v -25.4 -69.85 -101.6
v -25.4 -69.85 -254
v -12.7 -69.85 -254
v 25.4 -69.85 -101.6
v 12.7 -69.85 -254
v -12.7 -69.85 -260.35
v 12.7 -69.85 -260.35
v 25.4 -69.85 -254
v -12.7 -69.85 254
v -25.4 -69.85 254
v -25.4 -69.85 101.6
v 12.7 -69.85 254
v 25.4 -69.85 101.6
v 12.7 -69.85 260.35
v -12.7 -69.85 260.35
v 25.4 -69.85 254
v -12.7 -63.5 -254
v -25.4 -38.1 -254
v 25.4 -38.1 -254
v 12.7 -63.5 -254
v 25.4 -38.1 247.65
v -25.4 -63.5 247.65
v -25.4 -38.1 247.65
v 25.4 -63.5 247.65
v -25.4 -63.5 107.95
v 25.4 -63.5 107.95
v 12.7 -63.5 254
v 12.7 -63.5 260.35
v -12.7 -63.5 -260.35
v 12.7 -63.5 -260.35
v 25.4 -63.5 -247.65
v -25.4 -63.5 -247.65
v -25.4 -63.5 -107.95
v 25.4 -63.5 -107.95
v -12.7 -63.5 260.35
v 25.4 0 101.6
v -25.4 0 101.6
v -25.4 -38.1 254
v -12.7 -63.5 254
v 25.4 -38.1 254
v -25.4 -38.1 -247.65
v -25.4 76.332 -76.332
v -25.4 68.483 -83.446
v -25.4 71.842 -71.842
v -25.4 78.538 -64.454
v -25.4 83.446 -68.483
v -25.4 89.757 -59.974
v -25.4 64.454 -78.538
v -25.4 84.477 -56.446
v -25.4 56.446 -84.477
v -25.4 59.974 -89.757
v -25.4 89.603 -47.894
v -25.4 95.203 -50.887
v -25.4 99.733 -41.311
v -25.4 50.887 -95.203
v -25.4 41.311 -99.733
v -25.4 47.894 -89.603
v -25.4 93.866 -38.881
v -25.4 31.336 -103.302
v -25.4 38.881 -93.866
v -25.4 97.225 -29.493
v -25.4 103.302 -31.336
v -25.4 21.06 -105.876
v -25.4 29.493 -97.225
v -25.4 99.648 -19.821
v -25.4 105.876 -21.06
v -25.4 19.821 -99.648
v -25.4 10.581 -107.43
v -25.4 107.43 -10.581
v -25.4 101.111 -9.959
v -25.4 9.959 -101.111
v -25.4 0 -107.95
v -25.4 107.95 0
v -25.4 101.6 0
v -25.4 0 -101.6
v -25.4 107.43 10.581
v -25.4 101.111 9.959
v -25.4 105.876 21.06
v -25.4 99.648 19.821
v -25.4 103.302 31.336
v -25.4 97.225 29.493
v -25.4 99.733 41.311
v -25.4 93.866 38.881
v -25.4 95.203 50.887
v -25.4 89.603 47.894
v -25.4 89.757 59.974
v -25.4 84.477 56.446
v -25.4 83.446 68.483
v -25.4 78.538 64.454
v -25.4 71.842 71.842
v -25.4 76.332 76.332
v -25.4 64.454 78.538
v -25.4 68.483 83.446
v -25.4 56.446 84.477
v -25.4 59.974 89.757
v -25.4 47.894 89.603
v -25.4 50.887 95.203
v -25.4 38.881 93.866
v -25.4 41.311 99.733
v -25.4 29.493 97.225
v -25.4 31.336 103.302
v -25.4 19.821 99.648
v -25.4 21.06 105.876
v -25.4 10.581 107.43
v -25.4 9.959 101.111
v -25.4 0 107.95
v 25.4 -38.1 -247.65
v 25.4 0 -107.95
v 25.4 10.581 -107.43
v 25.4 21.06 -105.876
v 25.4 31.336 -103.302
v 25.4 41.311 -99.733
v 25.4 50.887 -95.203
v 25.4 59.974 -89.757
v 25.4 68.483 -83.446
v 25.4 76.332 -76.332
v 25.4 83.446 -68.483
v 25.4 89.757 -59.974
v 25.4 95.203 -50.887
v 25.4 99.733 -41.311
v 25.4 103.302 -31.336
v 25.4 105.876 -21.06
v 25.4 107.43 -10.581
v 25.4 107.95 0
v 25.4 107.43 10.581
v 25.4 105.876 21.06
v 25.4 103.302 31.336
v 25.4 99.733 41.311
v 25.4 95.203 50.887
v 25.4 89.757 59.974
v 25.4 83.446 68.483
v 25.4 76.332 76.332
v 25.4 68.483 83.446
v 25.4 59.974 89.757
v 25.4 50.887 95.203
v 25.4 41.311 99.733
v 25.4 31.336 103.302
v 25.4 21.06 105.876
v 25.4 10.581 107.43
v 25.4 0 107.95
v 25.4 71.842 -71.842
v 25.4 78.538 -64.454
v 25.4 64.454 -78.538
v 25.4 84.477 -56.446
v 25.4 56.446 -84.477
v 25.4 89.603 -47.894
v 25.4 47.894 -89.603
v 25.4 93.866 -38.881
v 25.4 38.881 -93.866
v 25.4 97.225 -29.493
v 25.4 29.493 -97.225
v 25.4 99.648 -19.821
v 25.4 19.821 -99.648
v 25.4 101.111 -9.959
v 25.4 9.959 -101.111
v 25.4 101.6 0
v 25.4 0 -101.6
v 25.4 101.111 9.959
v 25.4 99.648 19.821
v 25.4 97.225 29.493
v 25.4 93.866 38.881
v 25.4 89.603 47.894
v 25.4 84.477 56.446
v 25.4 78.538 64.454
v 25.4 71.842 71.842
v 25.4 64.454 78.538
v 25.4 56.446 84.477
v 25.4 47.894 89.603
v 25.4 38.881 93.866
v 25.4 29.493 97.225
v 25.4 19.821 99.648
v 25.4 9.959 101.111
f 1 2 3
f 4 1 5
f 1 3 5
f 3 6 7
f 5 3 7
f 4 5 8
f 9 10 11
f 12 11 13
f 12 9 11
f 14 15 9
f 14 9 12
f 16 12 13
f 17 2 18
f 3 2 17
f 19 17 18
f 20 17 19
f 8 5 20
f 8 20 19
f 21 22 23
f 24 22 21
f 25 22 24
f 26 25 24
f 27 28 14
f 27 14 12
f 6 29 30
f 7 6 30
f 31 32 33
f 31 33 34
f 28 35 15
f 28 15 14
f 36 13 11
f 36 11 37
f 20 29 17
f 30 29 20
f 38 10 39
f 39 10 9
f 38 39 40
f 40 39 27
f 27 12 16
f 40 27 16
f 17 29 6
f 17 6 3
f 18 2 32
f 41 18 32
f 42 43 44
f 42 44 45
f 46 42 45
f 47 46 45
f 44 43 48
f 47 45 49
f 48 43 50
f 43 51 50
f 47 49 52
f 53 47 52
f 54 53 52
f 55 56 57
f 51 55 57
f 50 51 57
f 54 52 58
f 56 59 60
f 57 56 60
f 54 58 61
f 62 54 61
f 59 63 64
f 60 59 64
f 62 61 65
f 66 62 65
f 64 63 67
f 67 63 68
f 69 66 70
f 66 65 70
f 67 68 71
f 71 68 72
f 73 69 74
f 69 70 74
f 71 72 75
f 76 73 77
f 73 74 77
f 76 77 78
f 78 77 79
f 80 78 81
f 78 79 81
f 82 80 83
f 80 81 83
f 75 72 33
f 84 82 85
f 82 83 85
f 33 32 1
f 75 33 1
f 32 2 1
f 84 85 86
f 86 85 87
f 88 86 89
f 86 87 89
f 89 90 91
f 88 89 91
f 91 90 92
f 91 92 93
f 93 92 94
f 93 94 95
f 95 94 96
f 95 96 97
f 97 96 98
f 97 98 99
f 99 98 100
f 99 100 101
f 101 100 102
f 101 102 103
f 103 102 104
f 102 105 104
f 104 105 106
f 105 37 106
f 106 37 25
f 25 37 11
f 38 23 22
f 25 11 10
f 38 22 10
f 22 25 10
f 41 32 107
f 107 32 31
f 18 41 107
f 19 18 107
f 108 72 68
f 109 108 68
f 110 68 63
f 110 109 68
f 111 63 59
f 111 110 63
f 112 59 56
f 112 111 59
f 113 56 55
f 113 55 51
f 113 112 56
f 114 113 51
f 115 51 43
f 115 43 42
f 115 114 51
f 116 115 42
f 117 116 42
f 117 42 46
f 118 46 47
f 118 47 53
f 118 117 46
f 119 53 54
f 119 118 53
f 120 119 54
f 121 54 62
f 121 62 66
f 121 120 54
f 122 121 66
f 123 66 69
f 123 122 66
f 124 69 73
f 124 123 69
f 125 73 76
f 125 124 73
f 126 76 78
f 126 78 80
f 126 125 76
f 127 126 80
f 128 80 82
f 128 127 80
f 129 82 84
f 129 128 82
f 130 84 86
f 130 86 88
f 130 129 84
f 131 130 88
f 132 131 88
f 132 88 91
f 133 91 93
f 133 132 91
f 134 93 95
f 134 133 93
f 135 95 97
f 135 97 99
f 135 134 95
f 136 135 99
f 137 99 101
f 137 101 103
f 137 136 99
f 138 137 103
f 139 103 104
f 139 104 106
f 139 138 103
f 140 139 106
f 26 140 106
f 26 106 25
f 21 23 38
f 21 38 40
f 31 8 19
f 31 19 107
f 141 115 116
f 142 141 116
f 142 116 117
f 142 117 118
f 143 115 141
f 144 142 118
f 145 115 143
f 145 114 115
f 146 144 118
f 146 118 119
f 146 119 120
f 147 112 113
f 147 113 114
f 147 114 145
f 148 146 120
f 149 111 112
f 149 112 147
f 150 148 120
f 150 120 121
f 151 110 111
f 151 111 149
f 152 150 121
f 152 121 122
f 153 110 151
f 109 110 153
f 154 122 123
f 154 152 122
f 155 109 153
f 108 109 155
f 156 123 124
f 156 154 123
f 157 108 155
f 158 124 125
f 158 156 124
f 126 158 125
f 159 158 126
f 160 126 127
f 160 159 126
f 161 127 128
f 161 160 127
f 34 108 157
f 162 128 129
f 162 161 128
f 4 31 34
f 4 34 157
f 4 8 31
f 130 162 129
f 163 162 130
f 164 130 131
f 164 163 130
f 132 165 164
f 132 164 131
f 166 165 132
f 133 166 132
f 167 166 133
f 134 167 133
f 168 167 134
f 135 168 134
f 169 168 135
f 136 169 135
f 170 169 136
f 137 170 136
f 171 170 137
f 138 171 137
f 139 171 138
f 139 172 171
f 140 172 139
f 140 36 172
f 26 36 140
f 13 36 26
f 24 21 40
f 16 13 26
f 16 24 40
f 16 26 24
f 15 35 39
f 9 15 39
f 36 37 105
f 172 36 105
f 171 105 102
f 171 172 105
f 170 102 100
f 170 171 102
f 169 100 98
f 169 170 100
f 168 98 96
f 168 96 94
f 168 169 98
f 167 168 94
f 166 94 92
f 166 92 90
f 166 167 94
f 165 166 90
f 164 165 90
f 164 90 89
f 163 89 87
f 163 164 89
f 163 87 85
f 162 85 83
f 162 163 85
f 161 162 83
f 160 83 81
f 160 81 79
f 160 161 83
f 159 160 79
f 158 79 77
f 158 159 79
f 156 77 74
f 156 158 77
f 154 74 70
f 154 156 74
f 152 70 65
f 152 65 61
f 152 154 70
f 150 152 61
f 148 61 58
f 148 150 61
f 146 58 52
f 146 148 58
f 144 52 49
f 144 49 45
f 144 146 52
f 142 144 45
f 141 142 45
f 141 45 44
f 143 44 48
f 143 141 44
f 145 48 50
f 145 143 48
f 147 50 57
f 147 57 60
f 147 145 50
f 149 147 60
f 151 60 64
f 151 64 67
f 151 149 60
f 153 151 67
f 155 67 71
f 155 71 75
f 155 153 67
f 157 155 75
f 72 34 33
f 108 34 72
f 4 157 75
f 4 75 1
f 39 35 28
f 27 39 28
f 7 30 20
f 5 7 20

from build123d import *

# Parameters (mm, degrees)
BOSS_EXTRUDE1_DEPTH = 25.4
BOSS_EXTRUDE2_REACH = 380.558
SKETCH2_W           = 50.8
SKETCH2_H           = 6.35
SKETCH3_W           = 25.4
SKETCH3_H           = 6.35
BOSS_EXTRUDE3_DEPTH = 6.35
SKETCH4_W           = 50.8
SKETCH4_H           = 6.35
BOSS_EXTRUDE4_DEPTH = 25.4


with BuildPart() as part:
    # Sketch1 → Boss-Extrude1 (new, symmetric)
    with BuildSketch(Plane(origin=(0, 0, 0), x_dir=(0, 0, -1), z_dir=(1, 0, 0))):
        with BuildLine():
            Line((-107.95, 0), (-107.95, -69.85))
            Line((-107.95, -69.85), (-101.6, -69.85))
            Line((-101.6, -69.85), (-101.6, 0))
            ThreePointArc((-101.6, 0), (0, 101.6), (101.6, 0))
            Line((101.6, 0), (101.6, -69.85))
            Line((101.6, -69.85), (107.95, -69.85))
            Line((107.95, -69.85), (107.95, 0))
            ThreePointArc((107.95, 0), (0, 107.95), (-107.95, 0))
        make_face()
    extrude(amount=BOSS_EXTRUDE1_DEPTH, both=True)

    # Sketch2 → Boss-Extrude2 (add, up to next)
    with BuildSketch(Plane.XY.offset(254), mode=Mode.PRIVATE) as boss_extrude2_sk1:
        with Locations((0, -66.675)):
            Rectangle(SKETCH2_W, SKETCH2_H)
    boss_extrude2_tool1 = extrude(boss_extrude2_sk1.sketch, amount=-BOSS_EXTRUDE2_REACH, mode=Mode.PRIVATE) - part.part
    boss_extrude2 = boss_extrude2_tool1.solids().sort_by_distance((0, -66.675, 254))[0]
    add(boss_extrude2)

    # Mirror1: Boss-Extrude2 across plane
    add(boss_extrude2.mirror(Plane.XY))

    # Sketch3 → Boss-Extrude3 (add)
    with BuildSketch(Plane(origin=(0, -63.5, 0), x_dir=(1, 0, 0), z_dir=(0, 1, 0))):
        with Locations((0, -257.175)):
            Rectangle(SKETCH3_W, SKETCH3_H)
    boss_extrude3 = extrude(amount=-BOSS_EXTRUDE3_DEPTH)

    # Mirror2: Boss-Extrude3 across plane
    add(boss_extrude3.mirror(Plane.XY))

    # Sketch4 → Boss-Extrude4 (add)
    with BuildSketch(Plane(origin=(0, -63.5, 0), x_dir=(1, 0, 0), z_dir=(0, 1, 0))):
        with Locations((0, -250.825)):
            Rectangle(SKETCH4_W, SKETCH4_H)
    boss_extrude4 = extrude(amount=BOSS_EXTRUDE4_DEPTH)

    # Mirror3: Boss-Extrude4 across plane
    add(boss_extrude4.mirror(Plane.XY))


solid = part.part
